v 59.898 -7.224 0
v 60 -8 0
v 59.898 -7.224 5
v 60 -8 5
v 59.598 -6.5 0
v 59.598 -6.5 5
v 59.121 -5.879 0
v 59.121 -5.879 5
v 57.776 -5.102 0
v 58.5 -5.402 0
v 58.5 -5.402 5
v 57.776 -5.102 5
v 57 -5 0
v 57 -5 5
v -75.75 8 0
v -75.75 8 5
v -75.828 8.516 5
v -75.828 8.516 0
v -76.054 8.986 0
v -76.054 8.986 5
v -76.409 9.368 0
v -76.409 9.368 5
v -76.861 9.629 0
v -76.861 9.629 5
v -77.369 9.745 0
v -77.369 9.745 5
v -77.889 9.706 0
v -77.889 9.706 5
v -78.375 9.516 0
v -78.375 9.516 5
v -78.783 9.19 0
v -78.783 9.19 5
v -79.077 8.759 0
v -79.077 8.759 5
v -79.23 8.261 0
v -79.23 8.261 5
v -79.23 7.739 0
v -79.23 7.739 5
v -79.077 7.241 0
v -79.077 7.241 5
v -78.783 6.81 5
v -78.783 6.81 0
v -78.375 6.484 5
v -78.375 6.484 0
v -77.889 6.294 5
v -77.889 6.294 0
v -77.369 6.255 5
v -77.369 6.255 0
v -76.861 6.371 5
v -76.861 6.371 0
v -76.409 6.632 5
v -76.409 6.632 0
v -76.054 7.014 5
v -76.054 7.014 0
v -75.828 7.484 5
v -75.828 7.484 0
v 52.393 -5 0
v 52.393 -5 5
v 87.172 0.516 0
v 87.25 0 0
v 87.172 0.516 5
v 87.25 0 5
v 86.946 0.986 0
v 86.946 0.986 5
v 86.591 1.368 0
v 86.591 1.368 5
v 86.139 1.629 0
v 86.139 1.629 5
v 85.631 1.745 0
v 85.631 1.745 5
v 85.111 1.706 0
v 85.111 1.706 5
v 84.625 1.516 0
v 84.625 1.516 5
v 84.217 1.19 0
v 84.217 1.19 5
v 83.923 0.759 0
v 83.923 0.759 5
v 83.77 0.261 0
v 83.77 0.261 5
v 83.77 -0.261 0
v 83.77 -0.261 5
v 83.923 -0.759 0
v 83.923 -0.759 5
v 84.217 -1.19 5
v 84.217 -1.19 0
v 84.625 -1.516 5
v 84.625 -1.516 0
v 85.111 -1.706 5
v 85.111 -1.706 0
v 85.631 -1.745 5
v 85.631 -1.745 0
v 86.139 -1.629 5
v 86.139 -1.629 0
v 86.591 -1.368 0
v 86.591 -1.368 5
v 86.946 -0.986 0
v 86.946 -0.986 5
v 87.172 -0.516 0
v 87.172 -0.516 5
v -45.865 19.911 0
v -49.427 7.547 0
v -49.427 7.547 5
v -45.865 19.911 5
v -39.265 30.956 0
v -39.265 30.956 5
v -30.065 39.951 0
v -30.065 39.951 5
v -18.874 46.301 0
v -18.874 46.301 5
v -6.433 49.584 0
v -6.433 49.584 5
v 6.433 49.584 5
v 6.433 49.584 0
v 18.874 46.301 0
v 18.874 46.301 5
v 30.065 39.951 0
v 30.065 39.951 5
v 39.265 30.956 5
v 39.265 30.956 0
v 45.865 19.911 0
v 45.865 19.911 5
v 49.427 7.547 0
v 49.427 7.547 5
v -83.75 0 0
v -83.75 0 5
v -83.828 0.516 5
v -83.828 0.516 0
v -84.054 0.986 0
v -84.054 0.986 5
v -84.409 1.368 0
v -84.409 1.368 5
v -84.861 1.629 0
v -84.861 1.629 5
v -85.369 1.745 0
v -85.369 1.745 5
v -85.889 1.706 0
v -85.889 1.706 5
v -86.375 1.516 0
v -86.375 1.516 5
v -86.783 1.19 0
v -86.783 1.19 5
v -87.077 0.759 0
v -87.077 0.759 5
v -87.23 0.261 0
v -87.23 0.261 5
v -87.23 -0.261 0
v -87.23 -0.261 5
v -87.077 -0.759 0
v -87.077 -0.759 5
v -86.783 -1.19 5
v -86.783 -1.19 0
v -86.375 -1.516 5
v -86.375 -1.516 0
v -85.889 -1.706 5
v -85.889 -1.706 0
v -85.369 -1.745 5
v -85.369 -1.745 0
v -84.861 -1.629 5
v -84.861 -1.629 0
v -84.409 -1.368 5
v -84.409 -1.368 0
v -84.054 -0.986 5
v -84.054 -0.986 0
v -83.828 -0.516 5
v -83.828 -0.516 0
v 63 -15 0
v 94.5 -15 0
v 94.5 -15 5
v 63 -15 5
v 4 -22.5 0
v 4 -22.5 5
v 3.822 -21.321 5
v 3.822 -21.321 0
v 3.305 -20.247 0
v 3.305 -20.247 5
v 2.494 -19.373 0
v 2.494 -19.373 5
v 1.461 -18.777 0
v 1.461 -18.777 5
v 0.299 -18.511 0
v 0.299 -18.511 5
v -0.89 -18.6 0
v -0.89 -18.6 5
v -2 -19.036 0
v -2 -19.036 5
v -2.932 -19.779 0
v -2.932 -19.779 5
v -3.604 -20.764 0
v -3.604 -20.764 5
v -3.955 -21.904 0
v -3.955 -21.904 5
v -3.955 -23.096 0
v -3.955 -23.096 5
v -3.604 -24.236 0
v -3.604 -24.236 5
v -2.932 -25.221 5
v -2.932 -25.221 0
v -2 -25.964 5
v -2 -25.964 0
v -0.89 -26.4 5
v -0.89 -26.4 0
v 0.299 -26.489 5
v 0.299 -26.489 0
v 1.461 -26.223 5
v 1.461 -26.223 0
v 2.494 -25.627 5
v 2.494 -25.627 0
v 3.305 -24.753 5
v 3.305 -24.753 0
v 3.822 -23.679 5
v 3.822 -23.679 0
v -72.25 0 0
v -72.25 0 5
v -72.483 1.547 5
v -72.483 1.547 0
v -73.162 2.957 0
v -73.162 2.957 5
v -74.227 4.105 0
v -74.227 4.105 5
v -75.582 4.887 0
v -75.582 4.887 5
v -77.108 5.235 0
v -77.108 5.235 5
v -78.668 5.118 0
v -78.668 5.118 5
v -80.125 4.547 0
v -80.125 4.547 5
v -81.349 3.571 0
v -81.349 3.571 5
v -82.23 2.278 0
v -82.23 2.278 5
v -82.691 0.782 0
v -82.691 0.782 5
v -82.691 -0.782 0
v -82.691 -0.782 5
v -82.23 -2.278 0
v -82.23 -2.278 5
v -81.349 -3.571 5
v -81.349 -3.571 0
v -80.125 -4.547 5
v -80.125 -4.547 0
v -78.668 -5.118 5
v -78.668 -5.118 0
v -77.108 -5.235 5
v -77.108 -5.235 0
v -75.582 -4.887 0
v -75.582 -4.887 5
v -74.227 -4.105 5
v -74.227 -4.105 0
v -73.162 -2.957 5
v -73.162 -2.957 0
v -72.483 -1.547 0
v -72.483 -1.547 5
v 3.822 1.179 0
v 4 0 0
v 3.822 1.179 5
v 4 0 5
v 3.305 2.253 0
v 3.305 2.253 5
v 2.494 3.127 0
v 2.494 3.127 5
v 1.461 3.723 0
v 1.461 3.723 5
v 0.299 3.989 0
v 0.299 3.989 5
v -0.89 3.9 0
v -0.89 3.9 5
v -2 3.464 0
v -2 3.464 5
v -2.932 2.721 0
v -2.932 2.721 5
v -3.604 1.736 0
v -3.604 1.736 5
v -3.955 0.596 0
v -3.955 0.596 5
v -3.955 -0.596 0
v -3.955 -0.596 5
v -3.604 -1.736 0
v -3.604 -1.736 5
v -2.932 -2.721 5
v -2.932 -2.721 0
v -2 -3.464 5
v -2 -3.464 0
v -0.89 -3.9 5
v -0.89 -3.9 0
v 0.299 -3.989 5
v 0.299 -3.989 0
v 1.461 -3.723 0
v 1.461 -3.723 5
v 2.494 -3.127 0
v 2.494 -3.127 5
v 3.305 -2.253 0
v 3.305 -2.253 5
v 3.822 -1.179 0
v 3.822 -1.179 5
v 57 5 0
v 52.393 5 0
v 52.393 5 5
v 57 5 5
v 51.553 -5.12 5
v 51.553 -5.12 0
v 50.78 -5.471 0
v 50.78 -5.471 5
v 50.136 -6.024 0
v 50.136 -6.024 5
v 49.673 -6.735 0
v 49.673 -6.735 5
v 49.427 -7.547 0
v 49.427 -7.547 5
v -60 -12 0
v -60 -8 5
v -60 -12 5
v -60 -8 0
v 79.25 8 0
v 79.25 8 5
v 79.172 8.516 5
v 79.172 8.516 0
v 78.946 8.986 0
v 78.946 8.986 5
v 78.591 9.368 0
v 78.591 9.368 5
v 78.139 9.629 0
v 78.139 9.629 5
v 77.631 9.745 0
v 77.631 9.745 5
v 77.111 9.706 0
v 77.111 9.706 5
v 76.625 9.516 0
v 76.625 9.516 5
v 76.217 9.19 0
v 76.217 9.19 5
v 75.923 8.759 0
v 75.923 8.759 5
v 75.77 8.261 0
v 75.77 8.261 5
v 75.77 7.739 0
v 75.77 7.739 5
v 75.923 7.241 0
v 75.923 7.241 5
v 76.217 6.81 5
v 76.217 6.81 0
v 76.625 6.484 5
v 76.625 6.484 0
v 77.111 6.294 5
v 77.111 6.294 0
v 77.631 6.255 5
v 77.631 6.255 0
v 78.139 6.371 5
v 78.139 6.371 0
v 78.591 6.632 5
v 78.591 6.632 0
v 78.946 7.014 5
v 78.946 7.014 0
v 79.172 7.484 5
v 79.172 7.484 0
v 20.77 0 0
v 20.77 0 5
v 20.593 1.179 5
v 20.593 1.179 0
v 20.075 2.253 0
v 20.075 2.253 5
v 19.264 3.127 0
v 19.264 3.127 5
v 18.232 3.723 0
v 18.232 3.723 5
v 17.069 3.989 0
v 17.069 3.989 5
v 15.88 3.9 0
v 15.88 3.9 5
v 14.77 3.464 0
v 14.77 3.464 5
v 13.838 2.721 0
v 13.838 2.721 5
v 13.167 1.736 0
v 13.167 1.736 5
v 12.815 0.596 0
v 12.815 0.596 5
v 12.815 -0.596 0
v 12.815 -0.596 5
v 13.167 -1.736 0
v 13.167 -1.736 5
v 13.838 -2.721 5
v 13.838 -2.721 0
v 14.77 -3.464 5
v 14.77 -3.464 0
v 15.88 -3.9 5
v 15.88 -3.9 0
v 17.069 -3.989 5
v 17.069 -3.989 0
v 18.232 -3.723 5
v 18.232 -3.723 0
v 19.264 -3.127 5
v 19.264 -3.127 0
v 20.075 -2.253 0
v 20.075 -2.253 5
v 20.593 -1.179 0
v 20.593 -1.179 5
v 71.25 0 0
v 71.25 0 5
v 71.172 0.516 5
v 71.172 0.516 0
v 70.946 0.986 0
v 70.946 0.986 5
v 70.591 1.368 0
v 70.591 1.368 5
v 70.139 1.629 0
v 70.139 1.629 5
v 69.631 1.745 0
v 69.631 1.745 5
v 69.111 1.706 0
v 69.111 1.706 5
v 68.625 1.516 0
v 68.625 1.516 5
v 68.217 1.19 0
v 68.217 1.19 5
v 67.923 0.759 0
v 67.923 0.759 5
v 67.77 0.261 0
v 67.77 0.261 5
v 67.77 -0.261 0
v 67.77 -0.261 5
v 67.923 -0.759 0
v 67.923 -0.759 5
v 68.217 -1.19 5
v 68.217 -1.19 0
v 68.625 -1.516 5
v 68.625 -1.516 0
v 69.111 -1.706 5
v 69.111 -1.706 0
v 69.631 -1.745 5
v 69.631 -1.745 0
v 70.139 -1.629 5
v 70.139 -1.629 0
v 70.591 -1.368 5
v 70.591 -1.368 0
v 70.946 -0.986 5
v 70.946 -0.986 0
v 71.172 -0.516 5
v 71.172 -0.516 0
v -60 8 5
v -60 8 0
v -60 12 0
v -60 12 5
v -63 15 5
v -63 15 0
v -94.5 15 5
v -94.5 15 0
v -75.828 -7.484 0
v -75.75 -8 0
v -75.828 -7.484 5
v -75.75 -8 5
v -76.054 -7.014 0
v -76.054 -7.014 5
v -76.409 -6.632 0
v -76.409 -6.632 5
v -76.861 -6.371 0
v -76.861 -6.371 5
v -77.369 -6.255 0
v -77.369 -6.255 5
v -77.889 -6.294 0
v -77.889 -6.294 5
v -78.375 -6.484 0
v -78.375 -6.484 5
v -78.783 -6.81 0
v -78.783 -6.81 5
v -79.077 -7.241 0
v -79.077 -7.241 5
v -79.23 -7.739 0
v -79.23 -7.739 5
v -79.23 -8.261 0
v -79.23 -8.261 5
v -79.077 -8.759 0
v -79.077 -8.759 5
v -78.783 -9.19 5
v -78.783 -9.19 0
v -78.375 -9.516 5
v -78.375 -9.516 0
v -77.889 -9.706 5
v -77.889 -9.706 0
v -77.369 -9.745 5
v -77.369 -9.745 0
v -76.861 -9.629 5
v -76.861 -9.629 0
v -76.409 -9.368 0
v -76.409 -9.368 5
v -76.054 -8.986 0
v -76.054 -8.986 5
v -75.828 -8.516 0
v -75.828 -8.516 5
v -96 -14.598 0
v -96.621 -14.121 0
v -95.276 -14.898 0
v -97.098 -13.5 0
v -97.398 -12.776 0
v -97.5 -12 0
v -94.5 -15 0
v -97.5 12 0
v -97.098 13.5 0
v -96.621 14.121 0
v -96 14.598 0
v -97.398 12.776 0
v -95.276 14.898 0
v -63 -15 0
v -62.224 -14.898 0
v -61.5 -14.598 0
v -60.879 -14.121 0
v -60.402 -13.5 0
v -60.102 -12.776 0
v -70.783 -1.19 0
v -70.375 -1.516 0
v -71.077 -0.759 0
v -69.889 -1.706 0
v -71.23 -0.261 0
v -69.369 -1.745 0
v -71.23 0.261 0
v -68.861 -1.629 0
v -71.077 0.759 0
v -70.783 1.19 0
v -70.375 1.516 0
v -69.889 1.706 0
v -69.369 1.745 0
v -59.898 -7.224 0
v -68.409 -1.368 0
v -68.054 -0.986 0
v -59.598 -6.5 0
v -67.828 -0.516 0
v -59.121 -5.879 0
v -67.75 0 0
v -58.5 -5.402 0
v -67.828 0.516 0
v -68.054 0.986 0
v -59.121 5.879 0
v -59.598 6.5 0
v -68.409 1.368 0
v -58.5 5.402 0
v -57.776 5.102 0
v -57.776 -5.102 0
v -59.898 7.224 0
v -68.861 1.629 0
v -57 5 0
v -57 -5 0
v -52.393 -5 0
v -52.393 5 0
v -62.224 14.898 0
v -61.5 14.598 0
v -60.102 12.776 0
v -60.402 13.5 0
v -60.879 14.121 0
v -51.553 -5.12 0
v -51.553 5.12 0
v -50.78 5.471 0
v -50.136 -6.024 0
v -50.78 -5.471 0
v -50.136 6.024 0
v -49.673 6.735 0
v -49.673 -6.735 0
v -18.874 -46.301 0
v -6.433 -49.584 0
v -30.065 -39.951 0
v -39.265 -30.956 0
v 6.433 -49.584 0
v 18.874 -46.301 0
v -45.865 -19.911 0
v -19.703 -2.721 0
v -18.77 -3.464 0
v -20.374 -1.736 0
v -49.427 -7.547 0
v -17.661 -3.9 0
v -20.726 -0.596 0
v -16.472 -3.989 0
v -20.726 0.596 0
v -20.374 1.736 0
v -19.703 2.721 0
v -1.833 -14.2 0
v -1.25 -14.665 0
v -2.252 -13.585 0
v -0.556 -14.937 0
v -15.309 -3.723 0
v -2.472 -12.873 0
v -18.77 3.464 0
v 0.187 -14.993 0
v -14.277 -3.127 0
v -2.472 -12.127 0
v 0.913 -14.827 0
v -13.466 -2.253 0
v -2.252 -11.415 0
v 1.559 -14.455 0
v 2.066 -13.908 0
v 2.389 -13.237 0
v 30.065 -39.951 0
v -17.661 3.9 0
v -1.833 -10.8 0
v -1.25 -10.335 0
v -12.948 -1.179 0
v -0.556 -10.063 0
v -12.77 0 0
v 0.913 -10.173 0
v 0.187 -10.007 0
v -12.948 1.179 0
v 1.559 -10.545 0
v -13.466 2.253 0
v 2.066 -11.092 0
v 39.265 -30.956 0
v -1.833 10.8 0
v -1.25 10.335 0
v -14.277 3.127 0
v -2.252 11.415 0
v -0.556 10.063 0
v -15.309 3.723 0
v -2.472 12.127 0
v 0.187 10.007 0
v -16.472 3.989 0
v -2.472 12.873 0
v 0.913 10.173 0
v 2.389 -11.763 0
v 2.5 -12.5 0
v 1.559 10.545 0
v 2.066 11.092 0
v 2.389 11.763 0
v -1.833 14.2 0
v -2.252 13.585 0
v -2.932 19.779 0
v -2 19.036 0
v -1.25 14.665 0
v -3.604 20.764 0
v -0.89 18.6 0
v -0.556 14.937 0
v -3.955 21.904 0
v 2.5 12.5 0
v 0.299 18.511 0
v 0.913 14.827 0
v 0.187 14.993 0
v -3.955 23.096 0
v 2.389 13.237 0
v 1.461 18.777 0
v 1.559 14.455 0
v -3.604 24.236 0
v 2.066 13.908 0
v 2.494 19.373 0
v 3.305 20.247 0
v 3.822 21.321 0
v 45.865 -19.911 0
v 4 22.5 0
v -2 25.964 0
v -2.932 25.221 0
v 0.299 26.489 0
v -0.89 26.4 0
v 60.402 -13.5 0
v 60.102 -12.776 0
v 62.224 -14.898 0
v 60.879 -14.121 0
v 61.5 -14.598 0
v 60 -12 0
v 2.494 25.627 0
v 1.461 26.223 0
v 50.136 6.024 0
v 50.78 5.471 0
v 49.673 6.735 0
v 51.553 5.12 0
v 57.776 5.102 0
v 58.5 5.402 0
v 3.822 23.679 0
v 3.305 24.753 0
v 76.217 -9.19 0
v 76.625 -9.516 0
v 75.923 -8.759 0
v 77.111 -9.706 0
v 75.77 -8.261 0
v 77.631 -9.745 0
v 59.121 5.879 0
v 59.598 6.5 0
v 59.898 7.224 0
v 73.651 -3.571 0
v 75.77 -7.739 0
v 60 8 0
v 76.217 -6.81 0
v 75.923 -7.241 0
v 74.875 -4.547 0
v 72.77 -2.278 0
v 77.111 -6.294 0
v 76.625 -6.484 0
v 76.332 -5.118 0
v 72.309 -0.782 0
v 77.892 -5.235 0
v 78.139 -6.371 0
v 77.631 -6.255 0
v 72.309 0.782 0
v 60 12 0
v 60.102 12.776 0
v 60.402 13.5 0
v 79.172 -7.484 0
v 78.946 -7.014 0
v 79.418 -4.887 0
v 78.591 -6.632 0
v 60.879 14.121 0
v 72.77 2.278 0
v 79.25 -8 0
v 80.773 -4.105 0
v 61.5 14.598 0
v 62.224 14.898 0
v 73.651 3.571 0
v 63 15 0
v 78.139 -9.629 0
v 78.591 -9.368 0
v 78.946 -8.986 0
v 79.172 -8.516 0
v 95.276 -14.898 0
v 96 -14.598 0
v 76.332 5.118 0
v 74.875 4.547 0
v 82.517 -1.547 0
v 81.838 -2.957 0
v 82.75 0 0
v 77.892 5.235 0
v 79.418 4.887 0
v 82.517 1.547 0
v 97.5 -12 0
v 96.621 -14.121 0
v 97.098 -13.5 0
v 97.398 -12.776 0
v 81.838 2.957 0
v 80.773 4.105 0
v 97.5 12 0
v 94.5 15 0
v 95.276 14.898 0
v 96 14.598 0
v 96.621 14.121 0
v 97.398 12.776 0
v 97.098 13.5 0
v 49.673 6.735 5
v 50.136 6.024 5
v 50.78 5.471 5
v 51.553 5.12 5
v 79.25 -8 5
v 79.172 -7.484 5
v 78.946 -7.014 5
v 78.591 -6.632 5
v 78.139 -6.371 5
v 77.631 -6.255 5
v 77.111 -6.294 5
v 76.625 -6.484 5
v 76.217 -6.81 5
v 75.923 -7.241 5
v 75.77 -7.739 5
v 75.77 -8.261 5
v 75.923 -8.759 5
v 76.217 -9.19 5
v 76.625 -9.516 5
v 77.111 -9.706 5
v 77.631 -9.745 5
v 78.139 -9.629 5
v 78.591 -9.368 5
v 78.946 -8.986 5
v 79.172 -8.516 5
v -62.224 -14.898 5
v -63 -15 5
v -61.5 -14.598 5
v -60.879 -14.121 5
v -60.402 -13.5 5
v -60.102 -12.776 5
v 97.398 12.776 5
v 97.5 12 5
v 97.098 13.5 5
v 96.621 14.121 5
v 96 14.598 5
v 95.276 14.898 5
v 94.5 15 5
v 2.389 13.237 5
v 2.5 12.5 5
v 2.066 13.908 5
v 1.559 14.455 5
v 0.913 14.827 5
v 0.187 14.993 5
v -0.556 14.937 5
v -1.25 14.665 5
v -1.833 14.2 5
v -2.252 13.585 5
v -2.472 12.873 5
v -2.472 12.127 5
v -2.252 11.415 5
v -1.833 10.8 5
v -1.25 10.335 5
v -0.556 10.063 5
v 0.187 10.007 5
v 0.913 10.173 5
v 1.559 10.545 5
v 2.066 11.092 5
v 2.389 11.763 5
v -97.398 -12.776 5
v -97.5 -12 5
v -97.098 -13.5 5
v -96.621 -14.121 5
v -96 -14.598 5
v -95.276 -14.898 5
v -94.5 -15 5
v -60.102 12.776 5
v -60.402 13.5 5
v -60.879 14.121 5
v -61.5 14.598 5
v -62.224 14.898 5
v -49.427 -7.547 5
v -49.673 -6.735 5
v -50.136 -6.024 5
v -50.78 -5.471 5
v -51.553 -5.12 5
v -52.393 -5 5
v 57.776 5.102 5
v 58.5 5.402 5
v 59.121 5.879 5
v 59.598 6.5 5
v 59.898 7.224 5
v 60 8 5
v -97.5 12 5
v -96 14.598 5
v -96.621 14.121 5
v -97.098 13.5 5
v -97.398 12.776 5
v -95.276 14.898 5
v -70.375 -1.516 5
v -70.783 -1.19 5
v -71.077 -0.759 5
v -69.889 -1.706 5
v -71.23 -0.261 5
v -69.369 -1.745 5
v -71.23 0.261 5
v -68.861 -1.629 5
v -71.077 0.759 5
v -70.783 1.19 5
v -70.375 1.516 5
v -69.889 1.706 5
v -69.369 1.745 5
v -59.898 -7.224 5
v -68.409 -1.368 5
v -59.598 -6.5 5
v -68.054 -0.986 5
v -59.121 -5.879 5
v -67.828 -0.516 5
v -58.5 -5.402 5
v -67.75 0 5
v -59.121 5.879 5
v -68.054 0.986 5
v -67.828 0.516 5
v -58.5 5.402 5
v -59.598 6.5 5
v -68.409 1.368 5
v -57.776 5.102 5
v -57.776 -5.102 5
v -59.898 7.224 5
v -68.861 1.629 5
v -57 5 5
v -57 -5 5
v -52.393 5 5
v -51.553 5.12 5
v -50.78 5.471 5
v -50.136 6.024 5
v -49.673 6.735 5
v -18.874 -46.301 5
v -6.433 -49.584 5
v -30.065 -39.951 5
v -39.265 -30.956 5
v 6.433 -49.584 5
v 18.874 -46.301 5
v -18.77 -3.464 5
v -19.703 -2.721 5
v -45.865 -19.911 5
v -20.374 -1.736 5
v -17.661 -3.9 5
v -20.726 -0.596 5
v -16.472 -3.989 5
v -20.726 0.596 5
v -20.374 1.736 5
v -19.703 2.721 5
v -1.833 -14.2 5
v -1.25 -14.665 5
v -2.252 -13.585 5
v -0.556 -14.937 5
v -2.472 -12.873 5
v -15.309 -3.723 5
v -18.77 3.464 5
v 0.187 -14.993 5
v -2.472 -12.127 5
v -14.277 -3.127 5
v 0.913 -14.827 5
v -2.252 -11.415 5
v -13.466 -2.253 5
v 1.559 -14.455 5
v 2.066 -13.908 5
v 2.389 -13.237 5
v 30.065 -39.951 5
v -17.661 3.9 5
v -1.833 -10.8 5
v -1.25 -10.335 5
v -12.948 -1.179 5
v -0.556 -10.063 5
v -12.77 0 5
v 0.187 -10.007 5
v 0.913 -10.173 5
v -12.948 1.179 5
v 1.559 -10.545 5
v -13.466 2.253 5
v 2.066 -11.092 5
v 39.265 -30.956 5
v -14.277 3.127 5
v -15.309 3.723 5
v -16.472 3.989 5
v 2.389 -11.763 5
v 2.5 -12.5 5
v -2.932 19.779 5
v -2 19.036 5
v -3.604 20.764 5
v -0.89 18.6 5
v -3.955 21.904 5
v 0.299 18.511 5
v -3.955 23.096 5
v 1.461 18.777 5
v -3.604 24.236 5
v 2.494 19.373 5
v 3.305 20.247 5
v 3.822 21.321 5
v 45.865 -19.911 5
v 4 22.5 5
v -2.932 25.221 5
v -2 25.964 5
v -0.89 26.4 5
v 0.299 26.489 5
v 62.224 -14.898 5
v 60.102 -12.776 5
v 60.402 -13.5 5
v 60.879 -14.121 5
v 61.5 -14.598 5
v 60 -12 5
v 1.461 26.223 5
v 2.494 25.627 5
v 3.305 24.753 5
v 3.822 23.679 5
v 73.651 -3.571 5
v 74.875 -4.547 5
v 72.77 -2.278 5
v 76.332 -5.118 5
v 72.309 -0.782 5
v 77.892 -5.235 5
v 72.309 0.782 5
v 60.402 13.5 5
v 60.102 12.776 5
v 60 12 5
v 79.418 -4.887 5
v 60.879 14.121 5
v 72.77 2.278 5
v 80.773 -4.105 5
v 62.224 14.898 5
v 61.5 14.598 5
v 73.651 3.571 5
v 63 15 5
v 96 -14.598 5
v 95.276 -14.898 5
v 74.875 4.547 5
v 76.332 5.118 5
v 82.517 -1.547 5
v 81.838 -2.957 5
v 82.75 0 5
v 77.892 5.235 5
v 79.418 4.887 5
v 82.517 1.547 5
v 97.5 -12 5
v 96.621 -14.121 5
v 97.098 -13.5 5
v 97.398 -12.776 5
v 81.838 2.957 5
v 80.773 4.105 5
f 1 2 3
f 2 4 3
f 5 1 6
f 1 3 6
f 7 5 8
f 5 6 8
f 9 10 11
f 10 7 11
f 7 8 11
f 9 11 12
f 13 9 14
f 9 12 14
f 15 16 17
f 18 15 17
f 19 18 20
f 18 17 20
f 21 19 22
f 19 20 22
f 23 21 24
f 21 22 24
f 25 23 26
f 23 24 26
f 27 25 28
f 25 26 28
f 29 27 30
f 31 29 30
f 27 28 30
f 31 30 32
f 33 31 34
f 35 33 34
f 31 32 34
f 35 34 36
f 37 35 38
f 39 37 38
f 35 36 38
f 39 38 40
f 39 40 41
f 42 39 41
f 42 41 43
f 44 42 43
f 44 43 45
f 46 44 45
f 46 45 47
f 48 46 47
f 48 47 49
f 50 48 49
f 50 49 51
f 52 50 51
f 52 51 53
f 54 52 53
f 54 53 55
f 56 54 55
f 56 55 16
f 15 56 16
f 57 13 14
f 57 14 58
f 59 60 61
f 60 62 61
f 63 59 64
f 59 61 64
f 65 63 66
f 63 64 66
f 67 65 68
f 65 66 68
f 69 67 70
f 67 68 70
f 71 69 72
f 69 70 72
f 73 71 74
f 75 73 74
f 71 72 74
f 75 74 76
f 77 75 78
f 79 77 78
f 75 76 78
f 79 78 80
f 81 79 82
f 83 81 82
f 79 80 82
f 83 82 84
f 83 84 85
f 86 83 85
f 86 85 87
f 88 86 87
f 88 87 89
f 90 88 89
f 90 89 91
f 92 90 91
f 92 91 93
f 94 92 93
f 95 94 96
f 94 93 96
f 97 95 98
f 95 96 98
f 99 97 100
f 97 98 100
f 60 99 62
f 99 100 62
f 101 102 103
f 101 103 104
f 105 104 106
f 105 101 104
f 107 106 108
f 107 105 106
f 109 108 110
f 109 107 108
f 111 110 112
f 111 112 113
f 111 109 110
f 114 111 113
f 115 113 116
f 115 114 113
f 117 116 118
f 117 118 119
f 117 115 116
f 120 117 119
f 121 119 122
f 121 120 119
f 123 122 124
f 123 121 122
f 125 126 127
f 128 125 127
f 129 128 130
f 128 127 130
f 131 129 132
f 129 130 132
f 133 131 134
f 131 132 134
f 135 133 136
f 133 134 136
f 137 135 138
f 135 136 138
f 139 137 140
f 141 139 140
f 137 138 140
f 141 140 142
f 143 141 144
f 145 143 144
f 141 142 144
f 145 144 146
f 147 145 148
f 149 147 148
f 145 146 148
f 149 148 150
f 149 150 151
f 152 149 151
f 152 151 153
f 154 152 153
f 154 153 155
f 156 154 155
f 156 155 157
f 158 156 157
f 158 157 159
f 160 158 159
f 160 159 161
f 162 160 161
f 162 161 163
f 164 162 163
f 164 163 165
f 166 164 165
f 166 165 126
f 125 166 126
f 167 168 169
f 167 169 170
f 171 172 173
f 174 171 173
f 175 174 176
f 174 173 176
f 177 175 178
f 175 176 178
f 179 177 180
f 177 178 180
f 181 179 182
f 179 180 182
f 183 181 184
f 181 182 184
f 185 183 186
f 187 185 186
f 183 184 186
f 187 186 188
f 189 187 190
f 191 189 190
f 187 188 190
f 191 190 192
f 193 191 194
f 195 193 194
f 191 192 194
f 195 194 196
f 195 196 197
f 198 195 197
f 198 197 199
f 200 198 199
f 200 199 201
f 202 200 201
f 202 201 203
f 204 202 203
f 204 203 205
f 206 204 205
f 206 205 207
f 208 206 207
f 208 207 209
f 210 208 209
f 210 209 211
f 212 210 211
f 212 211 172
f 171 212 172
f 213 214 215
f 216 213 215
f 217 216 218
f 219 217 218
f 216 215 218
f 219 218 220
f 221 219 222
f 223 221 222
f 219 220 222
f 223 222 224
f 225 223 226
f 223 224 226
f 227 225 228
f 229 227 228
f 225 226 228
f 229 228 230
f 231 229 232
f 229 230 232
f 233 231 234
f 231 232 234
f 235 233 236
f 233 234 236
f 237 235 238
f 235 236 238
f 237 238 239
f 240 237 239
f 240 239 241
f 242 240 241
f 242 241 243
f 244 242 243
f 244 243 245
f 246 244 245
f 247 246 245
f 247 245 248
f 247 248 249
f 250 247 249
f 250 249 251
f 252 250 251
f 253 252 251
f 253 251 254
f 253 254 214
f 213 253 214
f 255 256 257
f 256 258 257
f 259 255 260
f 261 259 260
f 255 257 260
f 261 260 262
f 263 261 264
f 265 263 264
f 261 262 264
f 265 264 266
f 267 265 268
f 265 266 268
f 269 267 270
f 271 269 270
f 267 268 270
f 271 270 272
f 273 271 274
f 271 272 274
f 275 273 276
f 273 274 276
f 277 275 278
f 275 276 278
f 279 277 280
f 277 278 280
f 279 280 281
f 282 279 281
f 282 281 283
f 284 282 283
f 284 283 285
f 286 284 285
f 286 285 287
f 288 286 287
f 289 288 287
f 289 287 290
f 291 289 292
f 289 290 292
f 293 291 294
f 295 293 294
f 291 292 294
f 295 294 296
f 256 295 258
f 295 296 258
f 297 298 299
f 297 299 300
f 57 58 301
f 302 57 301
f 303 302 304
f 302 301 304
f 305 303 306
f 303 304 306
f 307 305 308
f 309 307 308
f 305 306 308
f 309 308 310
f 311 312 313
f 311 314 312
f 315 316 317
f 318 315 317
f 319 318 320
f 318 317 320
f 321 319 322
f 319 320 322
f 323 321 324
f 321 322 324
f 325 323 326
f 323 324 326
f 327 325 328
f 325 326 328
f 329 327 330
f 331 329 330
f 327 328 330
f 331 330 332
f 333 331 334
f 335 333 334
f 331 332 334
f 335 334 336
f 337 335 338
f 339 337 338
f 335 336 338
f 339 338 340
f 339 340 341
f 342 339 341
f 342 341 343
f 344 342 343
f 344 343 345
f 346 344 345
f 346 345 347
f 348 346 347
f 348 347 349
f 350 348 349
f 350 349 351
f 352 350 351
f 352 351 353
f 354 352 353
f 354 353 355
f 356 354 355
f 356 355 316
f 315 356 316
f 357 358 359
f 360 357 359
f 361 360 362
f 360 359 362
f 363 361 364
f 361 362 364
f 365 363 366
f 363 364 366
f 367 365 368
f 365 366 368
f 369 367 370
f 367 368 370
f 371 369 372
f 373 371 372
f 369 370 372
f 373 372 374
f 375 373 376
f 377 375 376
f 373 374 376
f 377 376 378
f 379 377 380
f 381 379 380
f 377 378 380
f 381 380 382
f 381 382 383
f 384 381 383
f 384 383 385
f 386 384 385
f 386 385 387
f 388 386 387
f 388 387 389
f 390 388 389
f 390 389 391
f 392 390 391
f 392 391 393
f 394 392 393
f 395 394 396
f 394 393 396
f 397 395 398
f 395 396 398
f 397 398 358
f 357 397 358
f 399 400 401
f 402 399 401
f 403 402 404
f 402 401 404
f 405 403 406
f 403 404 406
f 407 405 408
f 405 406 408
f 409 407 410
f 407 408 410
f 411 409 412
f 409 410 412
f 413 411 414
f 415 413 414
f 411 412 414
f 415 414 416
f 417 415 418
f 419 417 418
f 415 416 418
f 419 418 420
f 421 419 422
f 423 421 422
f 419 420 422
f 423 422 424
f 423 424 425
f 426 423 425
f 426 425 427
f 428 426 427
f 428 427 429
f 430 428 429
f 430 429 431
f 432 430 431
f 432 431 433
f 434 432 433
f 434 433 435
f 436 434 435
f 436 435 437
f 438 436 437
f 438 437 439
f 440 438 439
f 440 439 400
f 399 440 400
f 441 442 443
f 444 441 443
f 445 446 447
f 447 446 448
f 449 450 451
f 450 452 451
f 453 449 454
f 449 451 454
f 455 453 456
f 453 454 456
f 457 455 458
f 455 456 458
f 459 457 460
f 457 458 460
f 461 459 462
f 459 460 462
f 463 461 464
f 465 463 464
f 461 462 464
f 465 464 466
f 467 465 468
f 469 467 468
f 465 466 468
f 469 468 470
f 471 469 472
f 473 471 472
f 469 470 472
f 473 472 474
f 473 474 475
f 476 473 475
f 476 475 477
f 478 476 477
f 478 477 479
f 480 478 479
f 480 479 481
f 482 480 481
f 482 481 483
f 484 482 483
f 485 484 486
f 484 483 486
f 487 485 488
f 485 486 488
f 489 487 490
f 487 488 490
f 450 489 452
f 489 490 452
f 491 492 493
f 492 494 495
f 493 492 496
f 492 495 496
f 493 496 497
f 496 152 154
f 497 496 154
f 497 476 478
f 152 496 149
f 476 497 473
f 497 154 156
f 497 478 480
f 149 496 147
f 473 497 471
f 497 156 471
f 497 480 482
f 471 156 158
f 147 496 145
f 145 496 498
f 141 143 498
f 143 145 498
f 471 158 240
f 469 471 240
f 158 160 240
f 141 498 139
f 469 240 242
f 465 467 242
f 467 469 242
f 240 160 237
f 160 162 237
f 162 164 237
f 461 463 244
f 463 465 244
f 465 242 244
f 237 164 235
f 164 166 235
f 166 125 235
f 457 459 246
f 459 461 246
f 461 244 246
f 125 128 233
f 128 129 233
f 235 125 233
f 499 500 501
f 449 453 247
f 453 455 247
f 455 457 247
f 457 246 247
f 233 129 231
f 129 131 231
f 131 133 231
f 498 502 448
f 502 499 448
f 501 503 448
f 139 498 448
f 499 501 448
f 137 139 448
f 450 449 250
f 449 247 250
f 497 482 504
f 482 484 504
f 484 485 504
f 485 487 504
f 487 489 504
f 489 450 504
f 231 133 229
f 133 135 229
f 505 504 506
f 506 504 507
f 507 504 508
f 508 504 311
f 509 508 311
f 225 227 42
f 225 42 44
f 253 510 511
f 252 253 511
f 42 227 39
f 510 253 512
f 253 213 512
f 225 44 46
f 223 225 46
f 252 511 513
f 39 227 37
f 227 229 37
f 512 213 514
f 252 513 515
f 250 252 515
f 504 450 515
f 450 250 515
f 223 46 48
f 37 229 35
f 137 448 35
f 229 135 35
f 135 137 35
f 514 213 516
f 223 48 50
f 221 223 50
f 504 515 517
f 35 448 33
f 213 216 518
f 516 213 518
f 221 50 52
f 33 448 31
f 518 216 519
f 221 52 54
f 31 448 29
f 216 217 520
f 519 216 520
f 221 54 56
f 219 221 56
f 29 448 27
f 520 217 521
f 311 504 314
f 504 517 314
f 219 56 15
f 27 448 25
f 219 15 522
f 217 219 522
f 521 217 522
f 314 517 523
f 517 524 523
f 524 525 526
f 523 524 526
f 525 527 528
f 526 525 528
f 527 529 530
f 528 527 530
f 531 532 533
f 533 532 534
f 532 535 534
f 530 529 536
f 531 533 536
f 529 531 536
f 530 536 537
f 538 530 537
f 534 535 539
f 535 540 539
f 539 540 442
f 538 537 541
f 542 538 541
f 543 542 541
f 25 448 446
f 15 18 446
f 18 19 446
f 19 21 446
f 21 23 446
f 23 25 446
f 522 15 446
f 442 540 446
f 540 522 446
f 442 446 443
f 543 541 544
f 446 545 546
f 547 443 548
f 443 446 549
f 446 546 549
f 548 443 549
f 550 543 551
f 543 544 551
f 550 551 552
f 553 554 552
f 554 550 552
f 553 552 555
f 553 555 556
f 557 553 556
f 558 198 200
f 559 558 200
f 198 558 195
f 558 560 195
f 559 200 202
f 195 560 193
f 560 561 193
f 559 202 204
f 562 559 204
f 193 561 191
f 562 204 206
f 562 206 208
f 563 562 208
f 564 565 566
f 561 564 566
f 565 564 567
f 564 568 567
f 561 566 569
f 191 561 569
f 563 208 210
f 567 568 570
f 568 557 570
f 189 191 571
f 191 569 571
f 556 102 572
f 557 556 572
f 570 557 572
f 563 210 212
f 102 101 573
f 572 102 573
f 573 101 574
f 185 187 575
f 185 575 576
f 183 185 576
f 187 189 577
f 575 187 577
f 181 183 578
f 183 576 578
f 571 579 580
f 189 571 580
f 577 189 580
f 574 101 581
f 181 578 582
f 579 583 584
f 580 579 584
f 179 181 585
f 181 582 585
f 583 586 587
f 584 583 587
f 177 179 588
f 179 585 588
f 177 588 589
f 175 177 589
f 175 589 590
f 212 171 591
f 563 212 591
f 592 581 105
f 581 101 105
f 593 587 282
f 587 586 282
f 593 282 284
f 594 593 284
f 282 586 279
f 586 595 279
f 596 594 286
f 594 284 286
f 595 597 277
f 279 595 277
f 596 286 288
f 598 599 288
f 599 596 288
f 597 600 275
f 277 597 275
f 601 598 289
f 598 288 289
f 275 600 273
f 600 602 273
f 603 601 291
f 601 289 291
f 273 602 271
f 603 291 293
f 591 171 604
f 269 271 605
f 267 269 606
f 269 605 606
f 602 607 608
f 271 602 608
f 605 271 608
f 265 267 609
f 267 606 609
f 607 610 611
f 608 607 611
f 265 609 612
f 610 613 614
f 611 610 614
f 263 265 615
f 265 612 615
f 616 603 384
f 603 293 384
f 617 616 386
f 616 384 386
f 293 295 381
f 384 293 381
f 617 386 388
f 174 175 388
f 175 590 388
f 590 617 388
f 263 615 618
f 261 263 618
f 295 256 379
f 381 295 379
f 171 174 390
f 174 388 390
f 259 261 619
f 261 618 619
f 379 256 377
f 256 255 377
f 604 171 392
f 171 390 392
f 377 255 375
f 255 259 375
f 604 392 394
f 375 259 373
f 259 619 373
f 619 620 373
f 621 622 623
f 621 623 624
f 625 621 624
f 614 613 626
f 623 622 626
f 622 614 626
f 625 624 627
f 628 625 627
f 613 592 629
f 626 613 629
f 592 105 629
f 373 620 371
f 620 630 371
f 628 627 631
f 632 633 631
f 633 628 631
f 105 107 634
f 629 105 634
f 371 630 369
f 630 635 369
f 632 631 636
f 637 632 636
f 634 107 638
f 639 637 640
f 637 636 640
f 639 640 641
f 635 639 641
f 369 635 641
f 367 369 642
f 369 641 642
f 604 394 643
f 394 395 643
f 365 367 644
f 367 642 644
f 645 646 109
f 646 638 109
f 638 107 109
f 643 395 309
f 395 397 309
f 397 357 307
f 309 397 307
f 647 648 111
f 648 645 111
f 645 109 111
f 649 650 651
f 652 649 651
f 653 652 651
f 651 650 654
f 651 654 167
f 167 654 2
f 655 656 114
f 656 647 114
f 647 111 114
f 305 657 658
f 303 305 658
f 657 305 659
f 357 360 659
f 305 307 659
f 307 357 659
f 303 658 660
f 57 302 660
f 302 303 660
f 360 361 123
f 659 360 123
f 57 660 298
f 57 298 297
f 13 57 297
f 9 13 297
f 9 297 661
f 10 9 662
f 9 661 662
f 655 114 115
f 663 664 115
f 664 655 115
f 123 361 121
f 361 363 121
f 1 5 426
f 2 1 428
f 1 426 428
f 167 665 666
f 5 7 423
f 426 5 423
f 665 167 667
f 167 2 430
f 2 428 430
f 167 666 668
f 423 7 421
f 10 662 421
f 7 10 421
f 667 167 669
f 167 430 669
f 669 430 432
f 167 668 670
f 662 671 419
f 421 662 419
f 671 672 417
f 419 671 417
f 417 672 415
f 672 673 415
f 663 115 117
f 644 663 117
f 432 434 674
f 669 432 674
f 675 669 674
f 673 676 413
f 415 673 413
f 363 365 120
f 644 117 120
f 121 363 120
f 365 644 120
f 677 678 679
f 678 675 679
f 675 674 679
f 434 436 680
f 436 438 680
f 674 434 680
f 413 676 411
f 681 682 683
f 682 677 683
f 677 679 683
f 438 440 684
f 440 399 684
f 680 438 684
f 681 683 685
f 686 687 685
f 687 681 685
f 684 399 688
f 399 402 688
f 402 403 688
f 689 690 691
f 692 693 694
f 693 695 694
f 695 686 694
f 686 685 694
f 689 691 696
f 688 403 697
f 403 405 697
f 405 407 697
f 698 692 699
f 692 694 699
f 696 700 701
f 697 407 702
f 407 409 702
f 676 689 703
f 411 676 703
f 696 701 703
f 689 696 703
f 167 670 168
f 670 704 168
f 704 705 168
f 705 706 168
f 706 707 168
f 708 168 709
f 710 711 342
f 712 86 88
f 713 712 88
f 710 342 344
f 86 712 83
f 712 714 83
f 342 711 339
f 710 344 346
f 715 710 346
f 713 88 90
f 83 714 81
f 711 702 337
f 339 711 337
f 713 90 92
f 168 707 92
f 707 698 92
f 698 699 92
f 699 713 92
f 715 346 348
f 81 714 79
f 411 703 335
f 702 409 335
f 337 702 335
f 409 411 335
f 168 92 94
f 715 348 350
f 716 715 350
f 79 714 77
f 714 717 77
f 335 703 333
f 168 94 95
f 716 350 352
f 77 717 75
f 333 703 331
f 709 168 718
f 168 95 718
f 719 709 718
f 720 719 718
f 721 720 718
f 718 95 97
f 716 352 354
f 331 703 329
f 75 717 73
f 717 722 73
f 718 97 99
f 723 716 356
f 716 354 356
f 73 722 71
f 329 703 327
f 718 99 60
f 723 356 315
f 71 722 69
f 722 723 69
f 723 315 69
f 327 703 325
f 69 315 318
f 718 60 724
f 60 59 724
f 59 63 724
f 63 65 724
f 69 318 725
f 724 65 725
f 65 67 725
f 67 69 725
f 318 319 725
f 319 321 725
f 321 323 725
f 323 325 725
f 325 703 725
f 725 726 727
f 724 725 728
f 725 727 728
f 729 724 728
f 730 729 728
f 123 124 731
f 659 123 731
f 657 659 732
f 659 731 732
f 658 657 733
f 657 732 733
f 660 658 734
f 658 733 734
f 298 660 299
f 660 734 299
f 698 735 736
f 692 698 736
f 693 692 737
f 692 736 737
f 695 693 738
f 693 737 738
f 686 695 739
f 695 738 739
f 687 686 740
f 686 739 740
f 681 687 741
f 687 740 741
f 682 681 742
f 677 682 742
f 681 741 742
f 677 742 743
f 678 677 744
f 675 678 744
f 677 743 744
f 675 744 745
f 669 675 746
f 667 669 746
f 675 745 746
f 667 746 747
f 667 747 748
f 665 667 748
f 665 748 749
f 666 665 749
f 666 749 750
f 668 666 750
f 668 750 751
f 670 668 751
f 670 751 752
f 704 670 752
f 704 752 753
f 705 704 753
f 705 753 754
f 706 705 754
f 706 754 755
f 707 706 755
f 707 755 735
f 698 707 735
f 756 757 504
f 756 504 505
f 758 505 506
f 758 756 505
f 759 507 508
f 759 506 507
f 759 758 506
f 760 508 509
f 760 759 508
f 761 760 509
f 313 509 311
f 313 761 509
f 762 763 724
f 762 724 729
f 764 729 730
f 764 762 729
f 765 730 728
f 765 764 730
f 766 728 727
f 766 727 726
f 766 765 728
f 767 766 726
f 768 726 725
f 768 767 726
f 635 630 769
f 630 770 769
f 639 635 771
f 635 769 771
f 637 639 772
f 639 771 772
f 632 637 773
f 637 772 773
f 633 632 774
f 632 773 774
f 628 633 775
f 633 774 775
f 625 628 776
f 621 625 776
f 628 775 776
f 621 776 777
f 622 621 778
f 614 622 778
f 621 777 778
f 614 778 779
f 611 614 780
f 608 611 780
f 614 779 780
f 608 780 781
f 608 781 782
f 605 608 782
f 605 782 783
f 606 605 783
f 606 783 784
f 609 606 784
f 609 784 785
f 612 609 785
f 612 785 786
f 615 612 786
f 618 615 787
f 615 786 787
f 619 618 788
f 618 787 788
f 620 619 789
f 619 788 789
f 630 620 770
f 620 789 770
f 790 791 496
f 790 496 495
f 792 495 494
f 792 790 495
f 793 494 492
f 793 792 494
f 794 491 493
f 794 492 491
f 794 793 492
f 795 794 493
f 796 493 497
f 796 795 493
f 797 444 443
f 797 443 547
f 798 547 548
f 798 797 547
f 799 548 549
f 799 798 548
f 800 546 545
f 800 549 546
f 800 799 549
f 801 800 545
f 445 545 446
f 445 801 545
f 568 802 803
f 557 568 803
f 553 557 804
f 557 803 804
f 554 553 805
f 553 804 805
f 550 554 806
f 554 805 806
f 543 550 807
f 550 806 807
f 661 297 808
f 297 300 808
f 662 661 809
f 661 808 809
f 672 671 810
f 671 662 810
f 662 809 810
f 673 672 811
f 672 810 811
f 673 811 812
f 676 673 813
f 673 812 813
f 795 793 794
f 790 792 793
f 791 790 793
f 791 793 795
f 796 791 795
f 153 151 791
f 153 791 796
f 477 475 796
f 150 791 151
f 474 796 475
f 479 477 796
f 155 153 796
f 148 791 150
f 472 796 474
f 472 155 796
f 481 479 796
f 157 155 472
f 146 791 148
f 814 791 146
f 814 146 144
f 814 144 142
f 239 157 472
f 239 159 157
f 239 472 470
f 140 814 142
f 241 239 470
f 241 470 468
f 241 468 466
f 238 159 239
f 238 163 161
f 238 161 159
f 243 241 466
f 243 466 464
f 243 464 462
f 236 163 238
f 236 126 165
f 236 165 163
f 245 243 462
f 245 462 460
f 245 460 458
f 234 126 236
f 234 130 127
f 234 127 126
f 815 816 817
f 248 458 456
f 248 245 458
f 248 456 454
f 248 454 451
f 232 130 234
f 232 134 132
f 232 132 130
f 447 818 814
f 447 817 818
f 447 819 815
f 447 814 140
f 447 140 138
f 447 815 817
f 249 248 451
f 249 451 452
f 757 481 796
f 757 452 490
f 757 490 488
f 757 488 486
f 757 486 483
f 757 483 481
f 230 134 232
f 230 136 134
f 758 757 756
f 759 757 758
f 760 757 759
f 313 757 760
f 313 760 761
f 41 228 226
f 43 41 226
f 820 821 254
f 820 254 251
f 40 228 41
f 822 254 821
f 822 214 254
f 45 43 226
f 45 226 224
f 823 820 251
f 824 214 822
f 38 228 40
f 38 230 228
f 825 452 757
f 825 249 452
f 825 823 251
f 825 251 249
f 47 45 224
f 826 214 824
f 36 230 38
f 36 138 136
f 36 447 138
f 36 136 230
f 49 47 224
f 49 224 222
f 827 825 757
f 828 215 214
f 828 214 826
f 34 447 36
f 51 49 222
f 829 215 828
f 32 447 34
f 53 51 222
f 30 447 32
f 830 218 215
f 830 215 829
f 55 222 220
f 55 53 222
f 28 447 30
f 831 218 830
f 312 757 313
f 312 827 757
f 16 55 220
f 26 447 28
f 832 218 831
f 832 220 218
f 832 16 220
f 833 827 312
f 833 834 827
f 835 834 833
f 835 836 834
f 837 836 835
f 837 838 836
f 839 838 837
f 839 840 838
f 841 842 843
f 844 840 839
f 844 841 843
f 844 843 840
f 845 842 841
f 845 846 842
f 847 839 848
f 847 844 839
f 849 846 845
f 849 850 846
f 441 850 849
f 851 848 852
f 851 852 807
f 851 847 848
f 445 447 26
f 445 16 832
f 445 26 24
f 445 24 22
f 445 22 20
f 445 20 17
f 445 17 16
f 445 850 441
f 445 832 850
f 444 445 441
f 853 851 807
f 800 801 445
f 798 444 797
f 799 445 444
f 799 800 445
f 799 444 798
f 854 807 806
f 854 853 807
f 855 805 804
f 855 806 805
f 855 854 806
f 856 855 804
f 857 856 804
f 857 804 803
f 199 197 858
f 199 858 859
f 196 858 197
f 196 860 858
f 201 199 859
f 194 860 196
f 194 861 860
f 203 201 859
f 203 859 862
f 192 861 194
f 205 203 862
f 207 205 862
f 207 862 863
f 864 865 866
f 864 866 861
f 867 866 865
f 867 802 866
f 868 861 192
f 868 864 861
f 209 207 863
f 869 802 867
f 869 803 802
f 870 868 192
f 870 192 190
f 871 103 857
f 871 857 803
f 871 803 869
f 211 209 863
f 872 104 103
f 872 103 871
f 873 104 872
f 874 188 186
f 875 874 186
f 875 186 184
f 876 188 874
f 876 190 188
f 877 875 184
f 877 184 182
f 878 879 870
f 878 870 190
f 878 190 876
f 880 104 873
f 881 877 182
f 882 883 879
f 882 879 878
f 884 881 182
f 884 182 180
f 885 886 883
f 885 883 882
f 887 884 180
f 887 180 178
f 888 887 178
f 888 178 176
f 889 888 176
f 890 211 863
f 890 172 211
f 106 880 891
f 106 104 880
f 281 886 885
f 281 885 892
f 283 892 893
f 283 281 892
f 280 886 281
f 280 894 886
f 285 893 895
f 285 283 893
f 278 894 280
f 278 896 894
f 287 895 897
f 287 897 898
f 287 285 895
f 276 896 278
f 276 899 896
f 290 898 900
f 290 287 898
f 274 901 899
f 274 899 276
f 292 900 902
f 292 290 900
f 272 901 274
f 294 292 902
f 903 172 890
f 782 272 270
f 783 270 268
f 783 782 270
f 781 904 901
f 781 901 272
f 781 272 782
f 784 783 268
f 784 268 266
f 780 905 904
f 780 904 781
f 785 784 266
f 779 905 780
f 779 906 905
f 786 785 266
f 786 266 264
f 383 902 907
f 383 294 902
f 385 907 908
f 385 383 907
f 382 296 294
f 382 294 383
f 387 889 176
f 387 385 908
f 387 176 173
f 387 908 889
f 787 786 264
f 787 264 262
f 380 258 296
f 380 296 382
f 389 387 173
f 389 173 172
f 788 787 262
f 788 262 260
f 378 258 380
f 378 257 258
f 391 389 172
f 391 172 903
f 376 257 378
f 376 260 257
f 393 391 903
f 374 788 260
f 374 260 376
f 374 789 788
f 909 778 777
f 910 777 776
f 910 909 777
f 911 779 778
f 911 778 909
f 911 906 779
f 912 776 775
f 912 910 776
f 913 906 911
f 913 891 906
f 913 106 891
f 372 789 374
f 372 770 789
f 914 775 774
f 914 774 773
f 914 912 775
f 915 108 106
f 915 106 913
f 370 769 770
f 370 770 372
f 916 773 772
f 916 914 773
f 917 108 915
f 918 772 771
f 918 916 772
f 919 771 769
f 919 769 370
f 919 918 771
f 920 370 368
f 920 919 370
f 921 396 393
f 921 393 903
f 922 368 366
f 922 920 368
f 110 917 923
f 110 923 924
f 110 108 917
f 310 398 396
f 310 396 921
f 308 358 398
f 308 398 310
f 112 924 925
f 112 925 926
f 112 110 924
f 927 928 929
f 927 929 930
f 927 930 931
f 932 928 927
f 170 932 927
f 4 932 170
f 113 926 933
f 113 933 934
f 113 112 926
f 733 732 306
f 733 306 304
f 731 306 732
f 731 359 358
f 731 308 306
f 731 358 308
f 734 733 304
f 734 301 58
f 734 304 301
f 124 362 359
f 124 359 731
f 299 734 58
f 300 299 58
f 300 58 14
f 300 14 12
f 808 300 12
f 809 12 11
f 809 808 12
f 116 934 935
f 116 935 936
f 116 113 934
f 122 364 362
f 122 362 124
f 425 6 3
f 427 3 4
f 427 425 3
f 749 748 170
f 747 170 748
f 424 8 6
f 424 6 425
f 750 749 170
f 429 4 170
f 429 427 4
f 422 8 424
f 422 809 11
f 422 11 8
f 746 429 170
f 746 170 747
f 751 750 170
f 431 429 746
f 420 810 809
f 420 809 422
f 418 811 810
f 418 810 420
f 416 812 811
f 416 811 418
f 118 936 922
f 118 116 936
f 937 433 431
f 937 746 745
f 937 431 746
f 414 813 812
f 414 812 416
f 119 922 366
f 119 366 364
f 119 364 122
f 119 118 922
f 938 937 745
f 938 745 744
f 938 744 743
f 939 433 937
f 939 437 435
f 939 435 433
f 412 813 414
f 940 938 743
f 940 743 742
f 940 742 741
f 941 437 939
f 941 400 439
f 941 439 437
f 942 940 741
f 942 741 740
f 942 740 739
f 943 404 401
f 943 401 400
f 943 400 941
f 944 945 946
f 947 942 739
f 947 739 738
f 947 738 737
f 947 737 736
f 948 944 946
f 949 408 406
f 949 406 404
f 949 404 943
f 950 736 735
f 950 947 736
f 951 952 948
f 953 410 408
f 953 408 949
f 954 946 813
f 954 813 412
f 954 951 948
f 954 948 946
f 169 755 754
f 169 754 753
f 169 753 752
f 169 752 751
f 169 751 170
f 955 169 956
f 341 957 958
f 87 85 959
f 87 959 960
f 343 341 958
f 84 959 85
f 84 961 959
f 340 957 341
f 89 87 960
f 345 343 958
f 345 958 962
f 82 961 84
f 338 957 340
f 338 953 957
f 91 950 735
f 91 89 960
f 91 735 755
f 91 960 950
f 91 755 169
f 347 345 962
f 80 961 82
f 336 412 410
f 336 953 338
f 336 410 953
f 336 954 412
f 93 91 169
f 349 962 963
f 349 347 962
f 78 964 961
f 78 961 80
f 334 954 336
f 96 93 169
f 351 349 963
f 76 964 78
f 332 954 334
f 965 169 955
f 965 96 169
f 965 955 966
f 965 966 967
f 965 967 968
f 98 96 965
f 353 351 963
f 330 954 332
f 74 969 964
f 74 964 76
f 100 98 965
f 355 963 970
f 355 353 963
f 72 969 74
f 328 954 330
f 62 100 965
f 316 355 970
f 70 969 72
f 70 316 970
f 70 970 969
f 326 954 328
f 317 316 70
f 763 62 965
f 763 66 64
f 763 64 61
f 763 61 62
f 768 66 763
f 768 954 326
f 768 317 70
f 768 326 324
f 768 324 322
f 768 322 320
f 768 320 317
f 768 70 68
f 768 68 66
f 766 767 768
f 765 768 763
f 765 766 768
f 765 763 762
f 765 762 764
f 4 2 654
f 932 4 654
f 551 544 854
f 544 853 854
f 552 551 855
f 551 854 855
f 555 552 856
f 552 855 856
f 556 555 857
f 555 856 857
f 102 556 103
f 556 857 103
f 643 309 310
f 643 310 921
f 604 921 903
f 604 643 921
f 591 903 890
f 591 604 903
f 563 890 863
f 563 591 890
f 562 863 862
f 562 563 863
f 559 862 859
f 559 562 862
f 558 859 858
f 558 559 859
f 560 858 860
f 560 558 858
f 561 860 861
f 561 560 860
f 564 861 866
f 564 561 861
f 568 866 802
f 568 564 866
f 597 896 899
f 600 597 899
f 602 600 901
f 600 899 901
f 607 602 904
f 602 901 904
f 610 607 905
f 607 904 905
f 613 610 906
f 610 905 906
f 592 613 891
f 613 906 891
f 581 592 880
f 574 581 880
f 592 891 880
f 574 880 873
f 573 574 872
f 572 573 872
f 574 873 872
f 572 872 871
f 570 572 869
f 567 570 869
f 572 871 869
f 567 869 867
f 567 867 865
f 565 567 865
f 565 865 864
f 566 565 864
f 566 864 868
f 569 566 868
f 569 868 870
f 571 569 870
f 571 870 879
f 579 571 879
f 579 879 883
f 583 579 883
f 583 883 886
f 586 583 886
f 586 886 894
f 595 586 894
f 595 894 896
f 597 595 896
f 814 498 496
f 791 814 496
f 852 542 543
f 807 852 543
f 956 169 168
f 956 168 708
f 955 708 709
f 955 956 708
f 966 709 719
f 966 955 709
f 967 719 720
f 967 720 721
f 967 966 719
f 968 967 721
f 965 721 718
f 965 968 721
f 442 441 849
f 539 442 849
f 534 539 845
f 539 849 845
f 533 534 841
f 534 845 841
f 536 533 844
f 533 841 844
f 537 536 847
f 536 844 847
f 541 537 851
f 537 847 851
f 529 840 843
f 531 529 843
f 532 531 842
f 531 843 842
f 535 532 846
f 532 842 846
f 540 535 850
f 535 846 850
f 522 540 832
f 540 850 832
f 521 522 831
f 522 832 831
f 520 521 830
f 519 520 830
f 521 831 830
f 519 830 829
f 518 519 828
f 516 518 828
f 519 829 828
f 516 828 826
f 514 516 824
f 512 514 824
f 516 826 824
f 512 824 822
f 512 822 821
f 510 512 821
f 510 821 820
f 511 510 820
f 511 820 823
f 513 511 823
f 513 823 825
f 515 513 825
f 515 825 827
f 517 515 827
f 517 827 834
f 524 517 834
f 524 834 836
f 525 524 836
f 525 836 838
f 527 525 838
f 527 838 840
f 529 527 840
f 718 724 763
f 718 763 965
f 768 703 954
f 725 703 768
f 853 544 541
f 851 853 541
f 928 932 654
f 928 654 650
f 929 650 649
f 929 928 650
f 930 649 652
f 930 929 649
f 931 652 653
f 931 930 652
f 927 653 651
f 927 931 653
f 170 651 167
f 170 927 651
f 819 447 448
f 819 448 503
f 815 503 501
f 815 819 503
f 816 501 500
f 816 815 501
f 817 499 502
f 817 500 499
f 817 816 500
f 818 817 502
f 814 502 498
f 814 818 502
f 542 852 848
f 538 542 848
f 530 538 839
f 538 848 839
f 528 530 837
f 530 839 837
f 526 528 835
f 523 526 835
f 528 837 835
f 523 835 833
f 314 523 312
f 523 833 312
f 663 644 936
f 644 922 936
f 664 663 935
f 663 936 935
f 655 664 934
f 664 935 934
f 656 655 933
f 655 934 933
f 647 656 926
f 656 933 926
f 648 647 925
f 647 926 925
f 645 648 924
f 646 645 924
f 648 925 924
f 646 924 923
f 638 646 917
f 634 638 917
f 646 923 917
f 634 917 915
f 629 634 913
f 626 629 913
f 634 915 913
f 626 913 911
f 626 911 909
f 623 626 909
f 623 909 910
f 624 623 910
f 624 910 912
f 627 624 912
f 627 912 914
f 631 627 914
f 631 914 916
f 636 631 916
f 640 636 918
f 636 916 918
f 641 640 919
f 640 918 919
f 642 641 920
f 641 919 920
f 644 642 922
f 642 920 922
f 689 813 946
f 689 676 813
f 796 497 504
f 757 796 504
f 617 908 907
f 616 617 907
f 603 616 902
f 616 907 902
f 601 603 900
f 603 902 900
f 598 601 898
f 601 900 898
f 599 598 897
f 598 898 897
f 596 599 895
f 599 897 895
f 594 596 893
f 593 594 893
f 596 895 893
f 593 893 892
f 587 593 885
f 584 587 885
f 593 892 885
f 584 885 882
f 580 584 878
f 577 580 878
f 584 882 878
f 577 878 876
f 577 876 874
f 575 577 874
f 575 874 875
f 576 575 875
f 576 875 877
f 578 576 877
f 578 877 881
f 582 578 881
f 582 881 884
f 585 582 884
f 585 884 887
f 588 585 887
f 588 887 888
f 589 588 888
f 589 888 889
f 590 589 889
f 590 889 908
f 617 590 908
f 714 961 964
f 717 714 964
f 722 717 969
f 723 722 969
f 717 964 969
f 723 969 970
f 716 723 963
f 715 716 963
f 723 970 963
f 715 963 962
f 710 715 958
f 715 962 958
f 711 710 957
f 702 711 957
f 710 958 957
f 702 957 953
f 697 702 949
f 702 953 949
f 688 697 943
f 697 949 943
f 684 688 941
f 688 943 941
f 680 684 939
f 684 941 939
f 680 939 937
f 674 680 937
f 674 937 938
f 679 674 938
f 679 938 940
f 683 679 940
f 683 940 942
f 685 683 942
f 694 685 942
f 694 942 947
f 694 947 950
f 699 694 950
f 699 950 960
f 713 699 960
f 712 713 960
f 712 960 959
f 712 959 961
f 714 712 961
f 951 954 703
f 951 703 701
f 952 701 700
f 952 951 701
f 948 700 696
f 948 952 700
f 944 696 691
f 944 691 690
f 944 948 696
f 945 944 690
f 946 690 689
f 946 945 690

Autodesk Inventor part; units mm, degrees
ref_plane "YZ Plane" through (0, 0, 0) normal (1, 0, 0) x (0, 1, 0)
ref_plane "XZ Plane" through (0, 0, 0) normal (0, 1, 0) x (-1, 0, 0)
ref_plane "XY Plane" through (0, 0, 0) normal (0, 0, 1) x (1, 0, 0)
sketch "Sketch1" plane through (0, 0, 0) normal (0, 0, 1) x (1, 0, 0)
  circle A0 centre (0, 0) radius 50
  line L0 (0, 0) -> (0, 20) construction
  line L1 (2.5, 15) -> (97.5, 15)
  line L2 (97.5, 15) -> (97.5, -15)
  line L3 (97.5, -15) -> (2.5, -15)
  line L4 (2.5, -15) -> (2.5, 15)
  line L5 (2.5, 15) -> (97.5, -15) construction
  line L6 (97.5, 15) -> (2.5, -15) construction
  line L7 (40, 5) -> (60, 5)
  line L8 (60, 5) -> (60, -5)
  line L9 (60, -5) -> (40, -5)
  line L10 (40, -5) -> (40, 5)
  line L11 (40, 5) -> (60, -5) construction
  line L12 (60, 5) -> (40, -5) construction
  line L13 (60, 5) -> (60, 15)
  line L14 (60, -5) -> (60, -15)
  line L15 (-2.5, 15) -> (-97.5, 15)
  line L16 (-97.5, 15) -> (-97.5, -15)
  line L17 (-97.5, -15) -> (-2.5, -15)
  line L18 (-2.5, -15) -> (-2.5, 15)
  line L19 (-2.5, 15) -> (-97.5, -15) construction
  line L20 (-97.5, 15) -> (-2.5, -15) construction
  line L21 (-40, 5) -> (-60, 5)
  line L22 (-60, 5) -> (-60, -5)
  line L23 (-60, -5) -> (-40, -5)
  line L24 (-40, -5) -> (-40, 5)
  line L25 (-40, 5) -> (-60, -5) construction
  line L26 (-60, 5) -> (-40, -5) construction
  line L27 (-60, 5) -> (-60, 15)
  line L28 (-60, -5) -> (-60, -15)
  point P0 (50, 0)
  point P1 (50, 0)
  point P2 (-50, 0)
  point P3 (-50, 0)
  point P4 (49.7494, 5)
  point P5 (49.7494, -5)
  point P6 (-49.7494, -5)
  point P7 (-49.7494, 5)
  dimension "d0" = 100
  dimension "d3" = 20
  dimension "d17" = 95
  dimension "d18" = 30
  dimension "d19" = 20
  dimension "d20" = 10
extrude "Extrusion1" add sketch "Sketch1" along normal blind 5 contours A0 L9 L10 L7 | A0 L7 L8 L9 | L7 L10 L9 A0 L3 L4 L1 | L1 L4 L3 A0 L17 L18 L15 | L13 L1 L2 L3 L14 L8 | L15 L18 L17 A0 L23 L24 L21 | L21 L24 L23 A0 | A0 L23 L22 L21 | L27 L22 L28 L17 L16 L15
sketch "Sketch2" plane through (0, 0, 5) normal (0, 0, 1) x (1, 0, 0)
  line L0 (0, 0) -> (-77.5, 0) construction
  circle A0 centre (-77.5, 0) radius 5.25
  line L1 (0, 0) -> (0, 20) construction
  circle A1 centre (-77.5, 0) radius 8
  circle A2 centre (-69.5, 0) radius 1.75
  circle A3 centre (-77.5, 8) radius 1.75
  circle A4 centre (-85.5, 0) radius 1.75
  circle A5 centre (-77.5, -8) radius 1.75
  circle A6 centre (77.5, 0) radius 5.25
  circle A7 centre (77.5, 0) radius 8
  circle A8 centre (69.5, 0) radius 1.75
  circle A9 centre (77.5, 8) radius 1.75
  circle A10 centre (85.5, 0) radius 1.75
  circle A11 centre (77.5, -8) radius 1.75
  dimension "d26" = 16
  dimension "d6" = 77.5
  dimension "d7" = 10.5
  dimension "d8" = 20
  dimension "d27" = 3.5
  dimension "d30" = 360
extrude "Extrusion2" cut sketch "Sketch2" against normal blind 7 contours A0 | A1 A2 | A1 A2 | A3 A1 | A1 A3 | A5 A1 | A1 A5 | A4 A1 | A1 A4 | A6 | A7 A10 | A7 A10 | A9 A7 | A7 A9 | A11 A7 | A7 A11 | A8 A7 | A7 A8
fillet "Fillet1" radius 3 16 edges at (-60, 5, 2.5) (-60, 15, 2.5) (-49.7494, 5, 2.5) (-60, -5, 2.5) (-60, -15, 2.5) (-49.7494, -5, 2.5) (-97.5, -15, 2.5) (-97.5, 15, 2.5) (97.5, 15, 2.5) (97.5, -15, 2.5) (60, -15, 2.5) (60, 15, 2.5) (60, -5, 2.5) (60, 5, 2.5) (49.7494, 5, 2.5) (49.7494, -5, 2.5)
sketch "Sketch4" plane through (0, 0, 5) normal (0, 0, 1) x (1, 0, 0)
  line L0 (-17.5, 5) -> (17.5, 5)
  line L1 (17.5, 5) -> (17.5, -5)
  line L2 (17.5, -5) -> (-17.5, -5)
  line L3 (-17.5, -5) -> (-17.5, 5)
  line L4 (-17.5, 5) -> (17.5, -5) construction
  line L5 (17.5, 5) -> (-17.5, -5) construction
  circle A0 centre (0, -5) radius 17.5
  circle A1 centre (0, 5) radius 17.5
  circle A2 centre (0, -22.5) radius 4
  circle A3 centre (0, 22.5) radius 4
  circle A4 centre (0, 0) radius 4
  circle A5 centre (16.7705, 0) radius 4
  circle A6 centre (-16.7705, 0) radius 4
  circle A7 centre (0, -12.5) radius 2.5
  circle A8 centre (0, 12.5) radius 2.5
  dimension "d32" = 35
  dimension "d33" = 10
  dimension "d34" = 35
  dimension "d35" = 35
  dimension "d36" = 8
  dimension "d37" = 8
  dimension "d38" = 8
  dimension "d39" = 8
  dimension "d40" = 8
  dimension "d41" = 5
  dimension "d42" = 5
extrude "Extrusion3" cut sketch "Sketch4" against normal blind 10 contours A6 A1 A0 L3 | L3 A6 | A3 A1 | A1 A3 | A6 A0 A1 | A8 A0 | A0 A8 | A6 A1 A0 | A1 A6 A0 | A5 A1 A0 | A0 A1 A5 | A5 L1 | L1 A5 A0 A1 | A0 A5 A1 | A2 A0 | A0 A2 | A7 A1 | A1 A7 | A4
properties part number "TAPA QUE DESPLAZA CON TORNILLOS"
